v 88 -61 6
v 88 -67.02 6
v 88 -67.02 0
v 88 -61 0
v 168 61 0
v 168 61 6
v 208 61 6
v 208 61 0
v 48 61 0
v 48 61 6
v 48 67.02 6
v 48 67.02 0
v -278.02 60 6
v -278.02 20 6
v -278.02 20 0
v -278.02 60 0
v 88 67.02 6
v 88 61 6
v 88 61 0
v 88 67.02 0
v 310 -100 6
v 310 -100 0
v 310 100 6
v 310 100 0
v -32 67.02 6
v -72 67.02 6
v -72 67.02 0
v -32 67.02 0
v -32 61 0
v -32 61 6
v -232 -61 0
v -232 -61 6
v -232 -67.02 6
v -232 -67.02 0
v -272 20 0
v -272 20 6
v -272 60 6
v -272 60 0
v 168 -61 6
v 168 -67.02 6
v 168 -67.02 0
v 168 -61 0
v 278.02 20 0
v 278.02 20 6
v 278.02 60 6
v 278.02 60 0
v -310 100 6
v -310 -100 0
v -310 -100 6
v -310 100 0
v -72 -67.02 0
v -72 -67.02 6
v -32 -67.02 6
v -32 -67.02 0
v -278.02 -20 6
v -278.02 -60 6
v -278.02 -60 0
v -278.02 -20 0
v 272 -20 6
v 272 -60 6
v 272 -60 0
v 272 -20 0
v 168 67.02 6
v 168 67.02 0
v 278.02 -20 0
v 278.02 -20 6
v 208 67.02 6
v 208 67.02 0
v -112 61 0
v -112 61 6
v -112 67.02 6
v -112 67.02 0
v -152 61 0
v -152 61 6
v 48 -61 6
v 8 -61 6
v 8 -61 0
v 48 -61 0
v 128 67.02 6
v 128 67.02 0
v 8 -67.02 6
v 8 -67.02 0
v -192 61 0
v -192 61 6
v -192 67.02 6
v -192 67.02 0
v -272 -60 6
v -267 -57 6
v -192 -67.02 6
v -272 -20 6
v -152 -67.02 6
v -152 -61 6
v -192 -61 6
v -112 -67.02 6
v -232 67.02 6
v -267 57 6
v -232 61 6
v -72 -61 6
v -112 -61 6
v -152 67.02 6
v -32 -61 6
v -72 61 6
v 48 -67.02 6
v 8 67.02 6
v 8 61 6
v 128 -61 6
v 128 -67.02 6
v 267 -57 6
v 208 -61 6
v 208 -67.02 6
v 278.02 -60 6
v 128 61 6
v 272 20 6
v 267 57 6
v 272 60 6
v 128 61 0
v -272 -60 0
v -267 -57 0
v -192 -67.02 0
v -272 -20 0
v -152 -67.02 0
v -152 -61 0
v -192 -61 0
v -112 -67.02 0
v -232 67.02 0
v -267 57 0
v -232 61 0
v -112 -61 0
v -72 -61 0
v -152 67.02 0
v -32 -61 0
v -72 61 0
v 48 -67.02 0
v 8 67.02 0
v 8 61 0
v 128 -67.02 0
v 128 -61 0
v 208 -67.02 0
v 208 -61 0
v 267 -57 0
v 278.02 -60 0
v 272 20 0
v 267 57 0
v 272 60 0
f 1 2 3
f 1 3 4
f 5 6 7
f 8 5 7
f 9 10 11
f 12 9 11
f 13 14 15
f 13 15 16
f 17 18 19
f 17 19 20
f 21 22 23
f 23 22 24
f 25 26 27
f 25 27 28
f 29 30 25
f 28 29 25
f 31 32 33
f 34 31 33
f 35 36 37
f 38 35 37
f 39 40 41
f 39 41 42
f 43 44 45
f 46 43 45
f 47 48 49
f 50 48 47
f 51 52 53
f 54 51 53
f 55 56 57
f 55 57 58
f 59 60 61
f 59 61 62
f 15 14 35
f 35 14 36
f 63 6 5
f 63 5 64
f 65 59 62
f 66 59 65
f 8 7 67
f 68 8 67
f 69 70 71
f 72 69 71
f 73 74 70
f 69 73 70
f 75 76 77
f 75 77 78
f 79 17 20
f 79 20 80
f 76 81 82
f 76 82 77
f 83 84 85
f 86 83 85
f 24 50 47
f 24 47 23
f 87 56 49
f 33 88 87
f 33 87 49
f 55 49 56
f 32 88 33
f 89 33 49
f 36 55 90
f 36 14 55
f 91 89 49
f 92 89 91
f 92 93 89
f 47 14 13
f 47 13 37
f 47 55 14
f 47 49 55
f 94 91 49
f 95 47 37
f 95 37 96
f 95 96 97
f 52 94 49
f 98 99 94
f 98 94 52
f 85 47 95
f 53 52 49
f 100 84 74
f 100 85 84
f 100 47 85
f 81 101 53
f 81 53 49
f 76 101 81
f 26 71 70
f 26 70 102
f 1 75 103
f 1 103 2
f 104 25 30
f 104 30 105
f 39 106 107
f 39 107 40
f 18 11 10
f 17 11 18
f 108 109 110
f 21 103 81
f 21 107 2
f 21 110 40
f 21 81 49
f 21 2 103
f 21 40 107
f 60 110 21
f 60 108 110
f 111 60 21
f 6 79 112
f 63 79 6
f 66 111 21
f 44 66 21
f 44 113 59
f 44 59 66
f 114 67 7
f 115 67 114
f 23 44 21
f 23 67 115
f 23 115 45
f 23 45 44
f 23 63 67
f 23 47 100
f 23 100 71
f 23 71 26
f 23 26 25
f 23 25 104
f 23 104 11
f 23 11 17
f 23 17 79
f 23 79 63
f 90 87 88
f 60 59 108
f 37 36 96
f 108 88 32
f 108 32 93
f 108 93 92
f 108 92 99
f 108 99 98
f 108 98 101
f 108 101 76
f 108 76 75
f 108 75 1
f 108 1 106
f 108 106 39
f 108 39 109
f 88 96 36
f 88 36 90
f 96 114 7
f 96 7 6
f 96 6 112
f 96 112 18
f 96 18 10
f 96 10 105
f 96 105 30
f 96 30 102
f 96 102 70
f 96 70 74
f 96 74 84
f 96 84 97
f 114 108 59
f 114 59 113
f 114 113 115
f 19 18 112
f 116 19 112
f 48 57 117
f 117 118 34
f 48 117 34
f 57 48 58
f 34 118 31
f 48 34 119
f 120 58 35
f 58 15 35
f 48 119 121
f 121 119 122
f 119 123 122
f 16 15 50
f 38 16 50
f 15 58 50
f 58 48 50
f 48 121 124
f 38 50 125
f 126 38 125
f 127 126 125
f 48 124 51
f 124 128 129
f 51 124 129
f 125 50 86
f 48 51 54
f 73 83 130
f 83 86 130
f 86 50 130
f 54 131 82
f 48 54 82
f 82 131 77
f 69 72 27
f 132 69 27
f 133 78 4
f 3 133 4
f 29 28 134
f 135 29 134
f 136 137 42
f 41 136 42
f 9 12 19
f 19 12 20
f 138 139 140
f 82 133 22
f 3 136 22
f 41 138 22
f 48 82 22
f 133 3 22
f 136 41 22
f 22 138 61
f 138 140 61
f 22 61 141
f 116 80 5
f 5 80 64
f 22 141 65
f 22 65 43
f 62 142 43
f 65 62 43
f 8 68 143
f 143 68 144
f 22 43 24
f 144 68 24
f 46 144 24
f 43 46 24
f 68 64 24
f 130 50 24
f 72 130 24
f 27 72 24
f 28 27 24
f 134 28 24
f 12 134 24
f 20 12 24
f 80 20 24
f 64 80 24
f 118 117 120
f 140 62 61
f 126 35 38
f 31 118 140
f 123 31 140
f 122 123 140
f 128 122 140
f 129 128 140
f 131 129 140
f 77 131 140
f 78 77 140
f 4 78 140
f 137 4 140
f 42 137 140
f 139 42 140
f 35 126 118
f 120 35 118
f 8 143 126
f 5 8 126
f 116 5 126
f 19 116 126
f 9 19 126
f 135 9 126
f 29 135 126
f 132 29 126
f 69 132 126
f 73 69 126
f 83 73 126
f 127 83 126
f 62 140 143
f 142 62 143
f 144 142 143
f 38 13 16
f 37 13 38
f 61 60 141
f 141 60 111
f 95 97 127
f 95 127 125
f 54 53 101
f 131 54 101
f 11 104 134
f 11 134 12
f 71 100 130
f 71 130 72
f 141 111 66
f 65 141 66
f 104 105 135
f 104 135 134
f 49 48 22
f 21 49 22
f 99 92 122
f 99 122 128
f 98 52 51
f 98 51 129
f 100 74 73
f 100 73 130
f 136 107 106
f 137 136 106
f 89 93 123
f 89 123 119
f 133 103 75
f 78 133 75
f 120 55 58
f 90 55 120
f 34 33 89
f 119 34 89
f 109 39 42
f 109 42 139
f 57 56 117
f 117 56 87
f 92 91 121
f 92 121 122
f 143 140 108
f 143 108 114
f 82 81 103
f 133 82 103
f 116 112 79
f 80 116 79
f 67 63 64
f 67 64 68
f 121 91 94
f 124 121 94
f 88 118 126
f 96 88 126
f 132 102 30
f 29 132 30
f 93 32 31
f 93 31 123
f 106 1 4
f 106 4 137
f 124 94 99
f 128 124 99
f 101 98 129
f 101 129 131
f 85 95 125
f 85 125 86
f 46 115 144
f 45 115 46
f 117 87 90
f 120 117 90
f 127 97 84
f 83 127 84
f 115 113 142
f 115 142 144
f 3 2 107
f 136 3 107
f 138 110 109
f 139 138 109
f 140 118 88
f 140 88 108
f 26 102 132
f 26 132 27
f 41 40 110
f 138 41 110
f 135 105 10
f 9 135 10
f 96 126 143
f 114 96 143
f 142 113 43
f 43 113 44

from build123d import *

# Parameters (mm, degrees)
CROQUIS1_W                = 620
CROQUIS1_H                = 200
CROQUIS1_W_2              = 534
CROQUIS1_H_2              = 114
SALIENTE_EXTRUIR1_DEPTH   = 6
CROQUIS2_W                = 6.02
CROQUIS2_H                = 40
CORTAR_EXTRUIR1_DEPTH     = 6
CROQUIS3_W                = 40
CROQUIS3_H                = 6.02
CORTAR_EXTRUIR2_DEPTH     = 6
MATRIZL1_COUNT            = 6
MATRIZL1_PITCH            = 80
SIMETR_A1_COPY_1_SKETCH_W = 40
SIMETR_A1_COPY_1_SKETCH_H = 6.02
SIMETR_A1_COPY_1_DEPTH    = 6
SIMETR_A1_COPY_2_SKETCH_W = 40
SIMETR_A1_COPY_2_SKETCH_H = 6.02
SIMETR_A1_COPY_2_DEPTH    = 6
SIMETR_A1_COPY_3_SKETCH_W = 40
SIMETR_A1_COPY_3_SKETCH_H = 6.02
SIMETR_A1_COPY_3_DEPTH    = 6
SIMETR_A1_COPY_4_SKETCH_W = 40
SIMETR_A1_COPY_4_SKETCH_H = 6.02
SIMETR_A1_COPY_4_DEPTH    = 6
SIMETR_A1_COPY_5_SKETCH_W = 40
SIMETR_A1_COPY_5_SKETCH_H = 6.02
SIMETR_A1_COPY_5_DEPTH    = 6


with BuildPart() as part:
    # Croquis1 → Saliente-Extruir1 (new body)
    with BuildSketch(Plane.XY):
        Rectangle(CROQUIS1_W, CROQUIS1_H)
        Rectangle(CROQUIS1_W_2, CROQUIS1_H_2, mode=Mode.SUBTRACT)
    extrude(amount=SALIENTE_EXTRUIR1_DEPTH)

    # Croquis2 → Cortar-Extruir1 (cut)
    with BuildSketch(Plane.XY.offset(6)):
        with Locations((-275.01, 40)):
            Rectangle(CROQUIS2_W, CROQUIS2_H)
        with Locations((-275.01, -40)):
            Rectangle(CROQUIS2_W, CROQUIS2_H)
        with Locations((275.01, -40)):
            Rectangle(CROQUIS2_W, CROQUIS2_H)
        with Locations((275.01, 40)):
            Rectangle(CROQUIS2_W, CROQUIS2_H)
    extrude(amount=-CORTAR_EXTRUIR1_DEPTH, mode=Mode.SUBTRACT)

    # Croquis3 → Cortar-Extruir2 (cut)
    with BuildSketch(Plane.XY.offset(6)):
        with Locations((-212, 64.01)):
            Rectangle(CROQUIS3_W, CROQUIS3_H)
    cortar_extruir2 = extrude(amount=-CORTAR_EXTRUIR2_DEPTH, mode=Mode.SUBTRACT)

    # MatrizL1: Cortar-Extruir2 ×6
    with Locations(*[(i * MATRIZL1_PITCH, 0, 0) for i in range(1, MATRIZL1_COUNT)]):
        add(cortar_extruir2, mode=Mode.SUBTRACT)

    # Simetría1: Cortar-Extruir2 across plane
    add(cortar_extruir2.mirror(Plane.ZX), mode=Mode.SUBTRACT)

    # Simetría1 copy 1 sketch → Simetría1 copy 1 (cut)
    with BuildSketch(Plane(origin=(80, 0, 6), x_dir=(1, 0, 0), z_dir=(0, 0, 1))):
        with Locations((-212, -64.01)):
            Rectangle(SIMETR_A1_COPY_1_SKETCH_W, SIMETR_A1_COPY_1_SKETCH_H)
    extrude(amount=-SIMETR_A1_COPY_1_DEPTH, mode=Mode.SUBTRACT)

    # Simetría1 copy 2 sketch → Simetría1 copy 2 (cut)
    with BuildSketch(Plane(origin=(160, 0, 6), x_dir=(1, 0, 0), z_dir=(0, 0, 1))):
        with Locations((-212, -64.01)):
            Rectangle(SIMETR_A1_COPY_2_SKETCH_W, SIMETR_A1_COPY_2_SKETCH_H)
    extrude(amount=-SIMETR_A1_COPY_2_DEPTH, mode=Mode.SUBTRACT)

    # Simetría1 copy 3 sketch → Simetría1 copy 3 (cut)
    with BuildSketch(Plane(origin=(240, 0, 6), x_dir=(1, 0, 0), z_dir=(0, 0, 1))):
        with Locations((-212, -64.01)):
            Rectangle(SIMETR_A1_COPY_3_SKETCH_W, SIMETR_A1_COPY_3_SKETCH_H)
    extrude(amount=-SIMETR_A1_COPY_3_DEPTH, mode=Mode.SUBTRACT)

    # Simetría1 copy 4 sketch → Simetría1 copy 4 (cut)
    with BuildSketch(Plane(origin=(320, 0, 6), x_dir=(1, 0, 0), z_dir=(0, 0, 1))):
        with Locations((-212, -64.01)):
            Rectangle(SIMETR_A1_COPY_4_SKETCH_W, SIMETR_A1_COPY_4_SKETCH_H)
    extrude(amount=-SIMETR_A1_COPY_4_DEPTH, mode=Mode.SUBTRACT)

    # Simetría1 copy 5 sketch → Simetría1 copy 5 (cut)
    with BuildSketch(Plane(origin=(400, 0, 6), x_dir=(1, 0, 0), z_dir=(0, 0, 1))):
        with Locations((-212, -64.01)):
            Rectangle(SIMETR_A1_COPY_5_SKETCH_W, SIMETR_A1_COPY_5_SKETCH_H)
    extrude(amount=-SIMETR_A1_COPY_5_DEPTH, mode=Mode.SUBTRACT)


solid = part.part
